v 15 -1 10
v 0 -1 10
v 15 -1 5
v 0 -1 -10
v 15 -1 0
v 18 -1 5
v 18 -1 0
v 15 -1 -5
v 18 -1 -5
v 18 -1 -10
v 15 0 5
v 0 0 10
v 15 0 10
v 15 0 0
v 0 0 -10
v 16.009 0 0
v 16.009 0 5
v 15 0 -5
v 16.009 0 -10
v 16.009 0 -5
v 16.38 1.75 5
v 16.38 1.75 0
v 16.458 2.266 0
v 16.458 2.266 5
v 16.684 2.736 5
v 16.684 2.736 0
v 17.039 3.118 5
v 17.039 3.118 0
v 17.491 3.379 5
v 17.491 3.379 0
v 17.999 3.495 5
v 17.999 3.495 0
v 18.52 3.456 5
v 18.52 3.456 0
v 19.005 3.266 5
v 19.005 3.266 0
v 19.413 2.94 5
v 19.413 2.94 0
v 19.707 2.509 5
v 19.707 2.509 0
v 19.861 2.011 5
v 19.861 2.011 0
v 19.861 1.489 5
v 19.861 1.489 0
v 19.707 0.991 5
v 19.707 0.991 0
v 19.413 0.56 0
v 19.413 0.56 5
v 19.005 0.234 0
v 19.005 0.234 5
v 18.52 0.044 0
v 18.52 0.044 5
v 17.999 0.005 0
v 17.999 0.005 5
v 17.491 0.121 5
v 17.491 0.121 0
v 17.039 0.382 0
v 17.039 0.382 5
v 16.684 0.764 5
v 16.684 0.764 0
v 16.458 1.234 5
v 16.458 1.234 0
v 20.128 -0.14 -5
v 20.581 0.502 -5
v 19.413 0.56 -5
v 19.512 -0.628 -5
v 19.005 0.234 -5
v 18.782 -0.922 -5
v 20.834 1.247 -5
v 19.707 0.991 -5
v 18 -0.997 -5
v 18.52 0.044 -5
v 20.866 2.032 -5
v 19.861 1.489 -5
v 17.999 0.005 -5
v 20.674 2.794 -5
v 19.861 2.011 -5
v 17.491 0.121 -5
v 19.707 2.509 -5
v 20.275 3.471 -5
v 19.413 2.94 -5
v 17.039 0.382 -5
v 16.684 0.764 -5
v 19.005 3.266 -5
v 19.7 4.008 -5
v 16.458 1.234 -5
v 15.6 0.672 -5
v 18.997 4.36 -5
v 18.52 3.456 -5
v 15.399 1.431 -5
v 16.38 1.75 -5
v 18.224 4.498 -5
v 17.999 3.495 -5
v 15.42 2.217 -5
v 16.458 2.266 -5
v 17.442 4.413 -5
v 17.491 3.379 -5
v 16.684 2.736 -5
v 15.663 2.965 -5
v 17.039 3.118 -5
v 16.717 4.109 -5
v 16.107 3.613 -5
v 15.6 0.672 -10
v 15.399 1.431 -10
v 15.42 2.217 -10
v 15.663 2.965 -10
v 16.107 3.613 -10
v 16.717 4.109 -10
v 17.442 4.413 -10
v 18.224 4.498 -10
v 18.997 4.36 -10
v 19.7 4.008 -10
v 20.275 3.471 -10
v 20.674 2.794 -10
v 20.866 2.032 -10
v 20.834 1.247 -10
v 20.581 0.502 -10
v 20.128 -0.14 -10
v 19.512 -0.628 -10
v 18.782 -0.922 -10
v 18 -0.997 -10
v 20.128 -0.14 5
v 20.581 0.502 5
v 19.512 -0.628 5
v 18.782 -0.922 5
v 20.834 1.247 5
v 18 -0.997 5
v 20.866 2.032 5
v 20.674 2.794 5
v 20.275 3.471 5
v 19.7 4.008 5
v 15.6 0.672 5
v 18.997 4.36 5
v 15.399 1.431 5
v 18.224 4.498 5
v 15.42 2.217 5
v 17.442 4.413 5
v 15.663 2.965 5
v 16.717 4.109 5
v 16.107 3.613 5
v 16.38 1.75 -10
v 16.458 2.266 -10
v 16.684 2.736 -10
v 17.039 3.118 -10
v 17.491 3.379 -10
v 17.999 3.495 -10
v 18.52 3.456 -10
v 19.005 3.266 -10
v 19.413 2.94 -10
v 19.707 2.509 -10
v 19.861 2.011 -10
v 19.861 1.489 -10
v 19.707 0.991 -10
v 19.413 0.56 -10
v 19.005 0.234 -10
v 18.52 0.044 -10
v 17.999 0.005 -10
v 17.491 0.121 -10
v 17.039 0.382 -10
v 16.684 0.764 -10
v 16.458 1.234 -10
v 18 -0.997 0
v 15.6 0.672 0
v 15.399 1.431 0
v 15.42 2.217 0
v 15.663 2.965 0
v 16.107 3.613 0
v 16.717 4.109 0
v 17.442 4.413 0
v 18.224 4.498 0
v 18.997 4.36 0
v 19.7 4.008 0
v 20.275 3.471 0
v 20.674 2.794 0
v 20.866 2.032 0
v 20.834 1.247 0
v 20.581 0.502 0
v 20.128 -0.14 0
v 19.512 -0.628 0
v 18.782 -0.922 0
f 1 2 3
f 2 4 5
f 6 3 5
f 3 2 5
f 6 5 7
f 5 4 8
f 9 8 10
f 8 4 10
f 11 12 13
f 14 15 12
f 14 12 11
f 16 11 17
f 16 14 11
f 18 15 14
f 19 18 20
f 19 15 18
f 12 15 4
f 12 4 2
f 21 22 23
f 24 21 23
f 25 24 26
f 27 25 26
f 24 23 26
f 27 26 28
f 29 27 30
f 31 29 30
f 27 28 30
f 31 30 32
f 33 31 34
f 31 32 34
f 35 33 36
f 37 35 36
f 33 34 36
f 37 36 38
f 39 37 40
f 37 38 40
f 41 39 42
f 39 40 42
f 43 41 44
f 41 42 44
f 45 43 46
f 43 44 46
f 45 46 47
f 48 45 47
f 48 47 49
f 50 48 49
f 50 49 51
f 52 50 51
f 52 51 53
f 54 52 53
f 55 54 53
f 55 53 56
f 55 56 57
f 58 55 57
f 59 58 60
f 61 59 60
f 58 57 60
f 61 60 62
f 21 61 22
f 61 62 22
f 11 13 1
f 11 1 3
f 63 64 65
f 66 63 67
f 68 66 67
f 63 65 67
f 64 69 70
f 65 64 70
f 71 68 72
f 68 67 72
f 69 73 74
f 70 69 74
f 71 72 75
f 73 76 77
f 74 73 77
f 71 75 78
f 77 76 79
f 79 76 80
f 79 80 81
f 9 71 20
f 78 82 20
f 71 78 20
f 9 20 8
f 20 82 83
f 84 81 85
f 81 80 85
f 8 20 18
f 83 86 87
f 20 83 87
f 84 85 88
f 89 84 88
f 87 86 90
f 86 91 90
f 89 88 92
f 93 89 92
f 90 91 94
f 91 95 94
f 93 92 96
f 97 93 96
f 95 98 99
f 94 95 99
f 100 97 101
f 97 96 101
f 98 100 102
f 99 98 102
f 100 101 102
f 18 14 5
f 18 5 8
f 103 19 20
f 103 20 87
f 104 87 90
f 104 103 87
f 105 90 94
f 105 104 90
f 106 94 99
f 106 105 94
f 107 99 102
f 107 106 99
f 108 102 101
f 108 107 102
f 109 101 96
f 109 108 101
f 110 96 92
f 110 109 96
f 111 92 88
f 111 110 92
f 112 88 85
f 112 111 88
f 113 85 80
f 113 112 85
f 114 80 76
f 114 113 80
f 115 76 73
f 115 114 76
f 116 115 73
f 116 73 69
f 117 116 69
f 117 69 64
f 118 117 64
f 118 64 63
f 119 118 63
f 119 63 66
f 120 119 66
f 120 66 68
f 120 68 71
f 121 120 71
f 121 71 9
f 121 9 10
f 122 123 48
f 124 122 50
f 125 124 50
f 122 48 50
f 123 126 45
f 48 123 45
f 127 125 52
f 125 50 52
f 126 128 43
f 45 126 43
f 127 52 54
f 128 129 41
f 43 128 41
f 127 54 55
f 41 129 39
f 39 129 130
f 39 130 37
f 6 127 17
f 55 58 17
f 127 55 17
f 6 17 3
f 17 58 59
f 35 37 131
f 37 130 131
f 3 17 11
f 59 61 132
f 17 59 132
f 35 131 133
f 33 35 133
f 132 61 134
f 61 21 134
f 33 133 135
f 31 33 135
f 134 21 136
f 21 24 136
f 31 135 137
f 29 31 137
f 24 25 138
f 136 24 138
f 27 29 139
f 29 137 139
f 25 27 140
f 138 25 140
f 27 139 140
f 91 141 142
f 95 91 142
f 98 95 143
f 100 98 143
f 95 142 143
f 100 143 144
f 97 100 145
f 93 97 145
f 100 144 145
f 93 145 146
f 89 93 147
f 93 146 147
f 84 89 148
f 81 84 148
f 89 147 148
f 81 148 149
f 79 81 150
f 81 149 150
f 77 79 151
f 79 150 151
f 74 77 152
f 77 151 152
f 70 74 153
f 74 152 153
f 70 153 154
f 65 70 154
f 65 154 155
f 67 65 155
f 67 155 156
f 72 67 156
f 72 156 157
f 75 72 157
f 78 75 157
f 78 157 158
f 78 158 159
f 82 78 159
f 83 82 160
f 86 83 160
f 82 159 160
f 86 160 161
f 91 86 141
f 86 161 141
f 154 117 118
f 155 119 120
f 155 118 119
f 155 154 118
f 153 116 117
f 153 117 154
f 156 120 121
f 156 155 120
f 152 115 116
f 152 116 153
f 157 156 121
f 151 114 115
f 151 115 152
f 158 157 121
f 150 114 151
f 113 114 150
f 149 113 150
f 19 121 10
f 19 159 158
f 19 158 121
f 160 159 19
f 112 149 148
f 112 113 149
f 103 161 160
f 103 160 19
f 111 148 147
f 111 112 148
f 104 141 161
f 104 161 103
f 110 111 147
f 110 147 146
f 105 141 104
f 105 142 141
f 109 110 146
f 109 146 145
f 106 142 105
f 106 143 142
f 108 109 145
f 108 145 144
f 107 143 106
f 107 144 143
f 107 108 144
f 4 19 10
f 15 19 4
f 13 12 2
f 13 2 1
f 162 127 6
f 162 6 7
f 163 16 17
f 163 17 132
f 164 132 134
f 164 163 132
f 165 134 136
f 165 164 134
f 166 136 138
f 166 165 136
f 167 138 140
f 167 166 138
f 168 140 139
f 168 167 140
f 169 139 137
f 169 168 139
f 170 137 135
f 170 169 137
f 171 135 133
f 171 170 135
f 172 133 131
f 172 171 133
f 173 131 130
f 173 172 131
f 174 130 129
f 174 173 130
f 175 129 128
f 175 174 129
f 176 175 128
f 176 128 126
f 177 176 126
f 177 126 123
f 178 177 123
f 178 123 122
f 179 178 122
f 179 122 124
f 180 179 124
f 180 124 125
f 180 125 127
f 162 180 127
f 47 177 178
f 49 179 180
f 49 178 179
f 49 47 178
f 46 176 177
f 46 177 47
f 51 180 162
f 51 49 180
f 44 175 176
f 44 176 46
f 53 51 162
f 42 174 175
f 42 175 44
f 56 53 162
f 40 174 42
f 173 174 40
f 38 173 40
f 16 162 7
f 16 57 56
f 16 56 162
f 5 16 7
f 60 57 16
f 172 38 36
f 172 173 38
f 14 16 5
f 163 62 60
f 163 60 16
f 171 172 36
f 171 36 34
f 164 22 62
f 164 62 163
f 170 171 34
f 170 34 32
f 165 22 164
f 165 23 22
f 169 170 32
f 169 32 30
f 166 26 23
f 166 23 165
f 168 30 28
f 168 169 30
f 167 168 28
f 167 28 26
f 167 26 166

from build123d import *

# Parameters (mm, degrees)
BOSS_EXTRUDE1_DEPTH = 1
SKETCH2_R           = 2.75
SKETCH2_R_2         = 1.75
BOSS_EXTRUDE2_DEPTH = 5
SKETCH3_R           = 2.75
SKETCH3_R_2         = 1.75
BOSS_EXTRUDE3_DEPTH = 5


with BuildPart() as part:
    # Sketch1 → Boss-Extrude1 (new body)
    with BuildSketch(Plane(origin=(0, 0, 0), x_dir=(1, 0, 0), z_dir=(0, 1, 0))):
        Polygon((0, 10), (0, -10), (15, -10), (15, -5), (18, -5), (18, 0), (15, 0), (15, 5), (18, 5), (18, 10), align=None)
    extrude(amount=-BOSS_EXTRUDE1_DEPTH)

    # Sketch2 → Boss-Extrude2 (add)
    with BuildSketch(Plane(origin=(0, 0, -10), x_dir=(-1, 0, 0), z_dir=(0, 0, -1))):
        with Locations((-18.130154704, 1.75)):
            Circle(SKETCH2_R)
        with Locations((-18.130154704, 1.75)):
            Circle(SKETCH2_R_2, mode=Mode.SUBTRACT)
    extrude(amount=-BOSS_EXTRUDE2_DEPTH)

    # Sketch3 → Boss-Extrude3 (add)
    with BuildSketch(Plane(origin=(0, 0, 0), x_dir=(-1, 0, 0), z_dir=(0, 0, -1))):
        with Locations((-18.130154704, 1.75)):
            Circle(SKETCH3_R)
        with Locations((-18.130154704, 1.75)):
            Circle(SKETCH3_R_2, mode=Mode.SUBTRACT)
    extrude(amount=-BOSS_EXTRUDE3_DEPTH)


solid = part.part
